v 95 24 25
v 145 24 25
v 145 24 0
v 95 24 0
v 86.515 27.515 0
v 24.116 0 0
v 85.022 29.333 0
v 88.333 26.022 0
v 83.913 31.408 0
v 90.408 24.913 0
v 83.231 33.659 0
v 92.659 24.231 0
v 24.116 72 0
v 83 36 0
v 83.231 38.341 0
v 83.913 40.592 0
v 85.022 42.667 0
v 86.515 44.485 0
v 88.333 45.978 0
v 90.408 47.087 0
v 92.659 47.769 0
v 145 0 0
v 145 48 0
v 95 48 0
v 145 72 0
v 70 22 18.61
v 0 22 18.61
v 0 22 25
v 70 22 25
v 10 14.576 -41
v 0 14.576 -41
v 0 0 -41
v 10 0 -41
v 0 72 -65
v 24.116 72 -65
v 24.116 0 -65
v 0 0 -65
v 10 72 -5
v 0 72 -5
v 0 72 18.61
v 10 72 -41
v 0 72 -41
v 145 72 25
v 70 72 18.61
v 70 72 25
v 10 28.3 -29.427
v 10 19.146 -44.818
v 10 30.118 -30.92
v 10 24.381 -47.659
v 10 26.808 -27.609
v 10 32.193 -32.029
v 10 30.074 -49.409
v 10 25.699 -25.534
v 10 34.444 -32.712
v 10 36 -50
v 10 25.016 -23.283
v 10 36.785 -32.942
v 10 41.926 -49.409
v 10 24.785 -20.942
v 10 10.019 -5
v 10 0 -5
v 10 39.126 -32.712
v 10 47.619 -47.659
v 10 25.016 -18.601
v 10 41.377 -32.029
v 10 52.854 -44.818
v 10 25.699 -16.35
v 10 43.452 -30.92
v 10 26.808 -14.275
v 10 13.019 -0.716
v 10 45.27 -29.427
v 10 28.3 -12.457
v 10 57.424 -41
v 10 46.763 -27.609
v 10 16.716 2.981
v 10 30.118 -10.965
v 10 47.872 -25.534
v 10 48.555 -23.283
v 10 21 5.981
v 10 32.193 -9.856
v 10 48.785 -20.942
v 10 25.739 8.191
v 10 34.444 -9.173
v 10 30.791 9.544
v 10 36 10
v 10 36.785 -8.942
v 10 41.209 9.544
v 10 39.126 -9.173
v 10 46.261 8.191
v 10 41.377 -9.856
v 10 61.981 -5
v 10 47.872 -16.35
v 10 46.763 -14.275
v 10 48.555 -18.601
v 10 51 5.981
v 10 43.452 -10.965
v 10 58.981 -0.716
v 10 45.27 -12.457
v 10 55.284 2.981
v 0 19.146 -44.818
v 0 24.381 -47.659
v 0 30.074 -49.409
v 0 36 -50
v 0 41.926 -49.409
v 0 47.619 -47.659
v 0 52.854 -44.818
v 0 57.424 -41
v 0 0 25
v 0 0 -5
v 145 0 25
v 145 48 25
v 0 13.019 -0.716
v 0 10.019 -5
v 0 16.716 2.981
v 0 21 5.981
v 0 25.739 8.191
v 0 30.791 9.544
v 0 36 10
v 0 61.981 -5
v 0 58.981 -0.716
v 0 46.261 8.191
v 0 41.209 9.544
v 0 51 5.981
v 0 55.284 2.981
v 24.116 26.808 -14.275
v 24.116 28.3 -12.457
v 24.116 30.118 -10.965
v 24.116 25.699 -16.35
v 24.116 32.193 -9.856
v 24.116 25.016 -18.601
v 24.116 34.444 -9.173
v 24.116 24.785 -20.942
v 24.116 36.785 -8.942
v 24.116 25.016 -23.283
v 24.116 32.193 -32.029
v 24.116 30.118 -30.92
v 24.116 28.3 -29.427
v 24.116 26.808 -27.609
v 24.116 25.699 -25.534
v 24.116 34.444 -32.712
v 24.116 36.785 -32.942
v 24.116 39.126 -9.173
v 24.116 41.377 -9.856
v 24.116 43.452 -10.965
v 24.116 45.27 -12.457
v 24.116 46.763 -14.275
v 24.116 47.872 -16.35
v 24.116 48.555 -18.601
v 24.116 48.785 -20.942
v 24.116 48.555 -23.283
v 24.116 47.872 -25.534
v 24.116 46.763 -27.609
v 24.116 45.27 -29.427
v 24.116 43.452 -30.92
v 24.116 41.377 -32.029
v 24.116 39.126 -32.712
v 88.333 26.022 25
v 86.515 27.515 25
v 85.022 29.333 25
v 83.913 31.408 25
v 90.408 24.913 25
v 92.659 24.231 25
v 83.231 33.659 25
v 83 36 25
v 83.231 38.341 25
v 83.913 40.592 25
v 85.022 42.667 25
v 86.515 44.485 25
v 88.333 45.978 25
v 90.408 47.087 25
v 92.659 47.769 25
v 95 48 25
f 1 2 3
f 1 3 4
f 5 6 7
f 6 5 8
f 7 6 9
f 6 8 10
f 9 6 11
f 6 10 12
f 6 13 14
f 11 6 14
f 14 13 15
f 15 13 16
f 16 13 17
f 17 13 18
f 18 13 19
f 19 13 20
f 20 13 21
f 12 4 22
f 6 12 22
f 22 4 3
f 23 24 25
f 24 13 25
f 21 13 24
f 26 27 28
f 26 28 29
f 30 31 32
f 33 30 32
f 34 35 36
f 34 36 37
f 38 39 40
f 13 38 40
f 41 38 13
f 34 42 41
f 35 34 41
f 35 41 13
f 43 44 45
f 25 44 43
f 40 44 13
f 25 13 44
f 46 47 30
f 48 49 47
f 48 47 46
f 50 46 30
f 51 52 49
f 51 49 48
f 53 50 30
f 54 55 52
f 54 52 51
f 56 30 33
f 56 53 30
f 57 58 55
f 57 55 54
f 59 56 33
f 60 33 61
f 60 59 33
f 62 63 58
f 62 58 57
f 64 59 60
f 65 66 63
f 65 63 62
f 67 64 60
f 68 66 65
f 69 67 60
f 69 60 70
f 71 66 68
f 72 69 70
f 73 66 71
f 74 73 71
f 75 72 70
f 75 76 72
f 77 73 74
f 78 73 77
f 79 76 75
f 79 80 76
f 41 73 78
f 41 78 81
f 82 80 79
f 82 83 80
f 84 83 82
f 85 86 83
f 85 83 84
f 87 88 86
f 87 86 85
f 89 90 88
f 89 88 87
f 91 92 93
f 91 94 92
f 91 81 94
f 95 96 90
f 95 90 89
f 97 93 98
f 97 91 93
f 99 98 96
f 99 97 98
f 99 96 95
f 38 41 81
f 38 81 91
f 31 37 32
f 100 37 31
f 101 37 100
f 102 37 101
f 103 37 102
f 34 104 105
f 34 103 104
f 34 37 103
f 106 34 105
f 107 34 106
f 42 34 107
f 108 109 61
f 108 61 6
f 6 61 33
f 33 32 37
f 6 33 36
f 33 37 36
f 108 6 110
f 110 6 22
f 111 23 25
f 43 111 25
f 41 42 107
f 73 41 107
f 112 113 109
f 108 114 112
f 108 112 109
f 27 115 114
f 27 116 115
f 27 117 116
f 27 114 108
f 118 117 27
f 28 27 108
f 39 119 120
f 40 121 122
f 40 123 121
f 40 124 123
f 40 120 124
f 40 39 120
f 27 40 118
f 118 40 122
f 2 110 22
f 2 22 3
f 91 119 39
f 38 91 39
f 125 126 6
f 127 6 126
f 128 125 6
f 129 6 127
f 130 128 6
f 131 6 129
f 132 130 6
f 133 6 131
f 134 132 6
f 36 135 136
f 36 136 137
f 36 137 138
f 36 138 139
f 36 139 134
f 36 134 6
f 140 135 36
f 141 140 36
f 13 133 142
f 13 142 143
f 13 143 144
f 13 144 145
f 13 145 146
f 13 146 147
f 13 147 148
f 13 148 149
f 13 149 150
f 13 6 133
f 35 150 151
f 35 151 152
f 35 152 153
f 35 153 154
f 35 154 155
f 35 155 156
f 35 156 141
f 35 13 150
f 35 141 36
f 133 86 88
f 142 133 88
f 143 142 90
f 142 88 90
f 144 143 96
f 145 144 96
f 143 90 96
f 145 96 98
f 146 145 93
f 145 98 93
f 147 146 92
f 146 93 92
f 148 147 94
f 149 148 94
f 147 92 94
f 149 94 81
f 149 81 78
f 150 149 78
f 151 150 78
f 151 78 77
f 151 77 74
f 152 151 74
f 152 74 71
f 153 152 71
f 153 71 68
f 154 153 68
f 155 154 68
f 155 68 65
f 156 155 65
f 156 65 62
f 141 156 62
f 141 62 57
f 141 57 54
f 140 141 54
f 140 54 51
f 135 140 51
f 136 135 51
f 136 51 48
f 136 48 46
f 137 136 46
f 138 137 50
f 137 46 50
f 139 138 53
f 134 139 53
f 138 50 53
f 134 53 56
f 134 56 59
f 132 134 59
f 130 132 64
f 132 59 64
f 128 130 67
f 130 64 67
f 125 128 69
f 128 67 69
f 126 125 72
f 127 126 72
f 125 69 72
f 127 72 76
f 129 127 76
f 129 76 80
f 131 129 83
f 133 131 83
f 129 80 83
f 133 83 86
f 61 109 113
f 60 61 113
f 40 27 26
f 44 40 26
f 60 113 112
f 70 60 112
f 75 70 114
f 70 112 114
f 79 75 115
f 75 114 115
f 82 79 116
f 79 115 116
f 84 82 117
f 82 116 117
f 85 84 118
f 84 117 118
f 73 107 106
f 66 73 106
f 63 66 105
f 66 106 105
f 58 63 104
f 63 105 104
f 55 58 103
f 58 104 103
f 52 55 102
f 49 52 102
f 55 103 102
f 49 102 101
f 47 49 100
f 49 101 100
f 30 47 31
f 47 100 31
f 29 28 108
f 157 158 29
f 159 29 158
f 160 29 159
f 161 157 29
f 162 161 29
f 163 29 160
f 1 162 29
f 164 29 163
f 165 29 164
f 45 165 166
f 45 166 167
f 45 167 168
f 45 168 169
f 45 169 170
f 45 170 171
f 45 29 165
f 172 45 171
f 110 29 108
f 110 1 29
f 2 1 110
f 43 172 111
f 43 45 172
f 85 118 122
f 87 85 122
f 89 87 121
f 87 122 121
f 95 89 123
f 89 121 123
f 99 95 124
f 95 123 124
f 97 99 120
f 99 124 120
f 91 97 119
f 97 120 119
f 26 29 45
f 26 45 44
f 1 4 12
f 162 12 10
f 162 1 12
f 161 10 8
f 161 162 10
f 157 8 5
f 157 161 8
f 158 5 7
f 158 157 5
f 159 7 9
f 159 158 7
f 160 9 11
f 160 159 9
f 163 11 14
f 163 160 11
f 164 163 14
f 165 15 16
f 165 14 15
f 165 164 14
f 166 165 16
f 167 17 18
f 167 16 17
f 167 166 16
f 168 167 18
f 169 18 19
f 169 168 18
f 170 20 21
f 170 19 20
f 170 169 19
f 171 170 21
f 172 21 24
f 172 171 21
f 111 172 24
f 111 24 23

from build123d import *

# Parameters (mm, degrees)
SKETCH1_W               = 145
SKETCH1_H               = 72
BOSS_EXTRUDE1_DEPTH     = 25
BOSS_EXTRUDE13_DEPTH    = 72
SKETCH16_R              = 12
CUT_EXTRUDE1_DEPTH      = 10
CUT_EXTRUDE2_DEPTH      = 175.453432182
CUT_EXTRUDE2_DEPTH_BACK = 50
SKETCH17_W              = 70
SKETCH17_H              = 6.390151493
SKETCH18_R              = 12
CUT_EXTRUDE3_DEPTH      = 24
CUT_EXTRUDE4_DEPTH      = 175.453432182
CUT_EXTRUDE4_DEPTH_BACK = 25


with BuildPart() as part:
    # Sketch1 → Boss-Extrude1 (new body)
    with BuildSketch(Plane.XY):
        with Locations((72.5, 36)):
            Rectangle(SKETCH1_W, SKETCH1_H)
    extrude(amount=BOSS_EXTRUDE1_DEPTH)

    # Sketch5 → Boss-Extrude13 (add)
    with BuildSketch(Plane(origin=(0, 72, 0), x_dir=(1, 0, 0), z_dir=(0, 1, 0))):
        Polygon((0, 65), (0, 0), (1.798699266, 0), (24.115506302, 0), (24.115506302, 65), align=None)
    extrude(amount=-BOSS_EXTRUDE13_DEPTH)

    # Sketch16 → Cut-Extrude1 (cut)
    # profile 1 of 6: a face of its own
    with BuildSketch(Plane.ZY):
        with BuildLine():
            ThreePointArc((-5, 61.980762114), (-23.767010787, 65.762554153), (-41, 57.424285286))
            Line((-41, 57.424285286), (-41, 14.575714714))
            ThreePointArc((-41, 14.575714714), (-23.767010787, 6.237445847), (-5, 10.019237886))
            Line((-5, 10.019237886), (-5, 61.980762114))
        make_face()
        with Locations((-20, 36)):
            Circle(SKETCH16_R, mode=Mode.SUBTRACT)
    # profile 2 of 6: a face of its own
    with BuildSketch(Plane.ZY):
        with Locations((-20, 36)):
            Circle(SKETCH16_R)
    # profile 3 of 6: a face of its own
    with BuildSketch(Plane.ZY):
        with BuildLine():
            ThreePointArc((10, 36), (5.980762114, 51), (-5, 61.980762114))
            Line((-5, 61.980762114), (-5, 10.019237886))
            ThreePointArc((-5, 10.019237886), (5.980762114, 21), (10, 36))
        make_face()
    # profile 4 of 6: a face of its own
    with BuildSketch(Plane.ZY):
        with BuildLine():
            Line((-41, 14.575714714), (-41, 57.424285286))
            ThreePointArc((-41, 57.424285286), (-50, 36), (-41, 14.575714714))
        make_face()
    # profile 5 of 6: a face of its own
    with BuildSketch(Plane.ZY):
        with BuildLine():
            Line((-5, 72), (-41, 72))
            Line((-41, 72), (-41, 57.424285286))
            ThreePointArc((-41, 57.424285286), (-23.767010787, 65.762554153), (-5, 61.980762114))
            Line((-5, 61.980762114), (-5, 72))
        make_face()
    # profile 6 of 6: a face of its own
    with BuildSketch(Plane.ZY):
        with BuildLine():
            ThreePointArc((-5, 10.019237886), (-23.767010787, 6.237445847), (-41, 14.575714714))
            Line((-41, 14.575714714), (-41, 0))
            Line((-41, 0), (-5, 0))
            Line((-5, 0), (-5, 10.019237886))
        make_face()
    extrude(amount=-CUT_EXTRUDE1_DEPTH, mode=Mode.SUBTRACT)

    # Sketch17 → Cut-Extrude2 (cut, two sides: drawn at the far end of the back side and taken through both)
    with BuildSketch(Plane(origin=(0, 72, 0), x_dir=(1, 0, 0), z_dir=(0, 1, 0)).offset(-CUT_EXTRUDE2_DEPTH_BACK)):
        with Locations((35, -21.804924254)):
            Rectangle(SKETCH17_W, SKETCH17_H)
    extrude(amount=CUT_EXTRUDE2_DEPTH + CUT_EXTRUDE2_DEPTH_BACK, mode=Mode.SUBTRACT)

    # Sketch18 → Cut-Extrude3 (cut)
    with BuildSketch(Plane.ZY.offset(-10)):
        with Locations((-20.942172697, 36.785143914)):
            Circle(SKETCH18_R)
    extrude(amount=-CUT_EXTRUDE3_DEPTH, mode=Mode.SUBTRACT)

    # Sketch19 → Cut-Extrude4 (cut, two sides: drawn at the far end of the back side and taken through both)
    with BuildSketch(Plane(origin=(0, 0, 0), x_dir=(-1, 0, 0), z_dir=(0, 0, -1)).offset(-CUT_EXTRUDE4_DEPTH_BACK)):
        with BuildLine():
            Line((-145, 24), (-95, 24))
            ThreePointArc((-95, 24), (-83, 36), (-95, 48))
            Line((-95, 48), (-145, 48))
            Line((-145, 48), (-145, 24))
        make_face()
    extrude(amount=CUT_EXTRUDE4_DEPTH + CUT_EXTRUDE4_DEPTH_BACK, mode=Mode.SUBTRACT)


solid = part.part
